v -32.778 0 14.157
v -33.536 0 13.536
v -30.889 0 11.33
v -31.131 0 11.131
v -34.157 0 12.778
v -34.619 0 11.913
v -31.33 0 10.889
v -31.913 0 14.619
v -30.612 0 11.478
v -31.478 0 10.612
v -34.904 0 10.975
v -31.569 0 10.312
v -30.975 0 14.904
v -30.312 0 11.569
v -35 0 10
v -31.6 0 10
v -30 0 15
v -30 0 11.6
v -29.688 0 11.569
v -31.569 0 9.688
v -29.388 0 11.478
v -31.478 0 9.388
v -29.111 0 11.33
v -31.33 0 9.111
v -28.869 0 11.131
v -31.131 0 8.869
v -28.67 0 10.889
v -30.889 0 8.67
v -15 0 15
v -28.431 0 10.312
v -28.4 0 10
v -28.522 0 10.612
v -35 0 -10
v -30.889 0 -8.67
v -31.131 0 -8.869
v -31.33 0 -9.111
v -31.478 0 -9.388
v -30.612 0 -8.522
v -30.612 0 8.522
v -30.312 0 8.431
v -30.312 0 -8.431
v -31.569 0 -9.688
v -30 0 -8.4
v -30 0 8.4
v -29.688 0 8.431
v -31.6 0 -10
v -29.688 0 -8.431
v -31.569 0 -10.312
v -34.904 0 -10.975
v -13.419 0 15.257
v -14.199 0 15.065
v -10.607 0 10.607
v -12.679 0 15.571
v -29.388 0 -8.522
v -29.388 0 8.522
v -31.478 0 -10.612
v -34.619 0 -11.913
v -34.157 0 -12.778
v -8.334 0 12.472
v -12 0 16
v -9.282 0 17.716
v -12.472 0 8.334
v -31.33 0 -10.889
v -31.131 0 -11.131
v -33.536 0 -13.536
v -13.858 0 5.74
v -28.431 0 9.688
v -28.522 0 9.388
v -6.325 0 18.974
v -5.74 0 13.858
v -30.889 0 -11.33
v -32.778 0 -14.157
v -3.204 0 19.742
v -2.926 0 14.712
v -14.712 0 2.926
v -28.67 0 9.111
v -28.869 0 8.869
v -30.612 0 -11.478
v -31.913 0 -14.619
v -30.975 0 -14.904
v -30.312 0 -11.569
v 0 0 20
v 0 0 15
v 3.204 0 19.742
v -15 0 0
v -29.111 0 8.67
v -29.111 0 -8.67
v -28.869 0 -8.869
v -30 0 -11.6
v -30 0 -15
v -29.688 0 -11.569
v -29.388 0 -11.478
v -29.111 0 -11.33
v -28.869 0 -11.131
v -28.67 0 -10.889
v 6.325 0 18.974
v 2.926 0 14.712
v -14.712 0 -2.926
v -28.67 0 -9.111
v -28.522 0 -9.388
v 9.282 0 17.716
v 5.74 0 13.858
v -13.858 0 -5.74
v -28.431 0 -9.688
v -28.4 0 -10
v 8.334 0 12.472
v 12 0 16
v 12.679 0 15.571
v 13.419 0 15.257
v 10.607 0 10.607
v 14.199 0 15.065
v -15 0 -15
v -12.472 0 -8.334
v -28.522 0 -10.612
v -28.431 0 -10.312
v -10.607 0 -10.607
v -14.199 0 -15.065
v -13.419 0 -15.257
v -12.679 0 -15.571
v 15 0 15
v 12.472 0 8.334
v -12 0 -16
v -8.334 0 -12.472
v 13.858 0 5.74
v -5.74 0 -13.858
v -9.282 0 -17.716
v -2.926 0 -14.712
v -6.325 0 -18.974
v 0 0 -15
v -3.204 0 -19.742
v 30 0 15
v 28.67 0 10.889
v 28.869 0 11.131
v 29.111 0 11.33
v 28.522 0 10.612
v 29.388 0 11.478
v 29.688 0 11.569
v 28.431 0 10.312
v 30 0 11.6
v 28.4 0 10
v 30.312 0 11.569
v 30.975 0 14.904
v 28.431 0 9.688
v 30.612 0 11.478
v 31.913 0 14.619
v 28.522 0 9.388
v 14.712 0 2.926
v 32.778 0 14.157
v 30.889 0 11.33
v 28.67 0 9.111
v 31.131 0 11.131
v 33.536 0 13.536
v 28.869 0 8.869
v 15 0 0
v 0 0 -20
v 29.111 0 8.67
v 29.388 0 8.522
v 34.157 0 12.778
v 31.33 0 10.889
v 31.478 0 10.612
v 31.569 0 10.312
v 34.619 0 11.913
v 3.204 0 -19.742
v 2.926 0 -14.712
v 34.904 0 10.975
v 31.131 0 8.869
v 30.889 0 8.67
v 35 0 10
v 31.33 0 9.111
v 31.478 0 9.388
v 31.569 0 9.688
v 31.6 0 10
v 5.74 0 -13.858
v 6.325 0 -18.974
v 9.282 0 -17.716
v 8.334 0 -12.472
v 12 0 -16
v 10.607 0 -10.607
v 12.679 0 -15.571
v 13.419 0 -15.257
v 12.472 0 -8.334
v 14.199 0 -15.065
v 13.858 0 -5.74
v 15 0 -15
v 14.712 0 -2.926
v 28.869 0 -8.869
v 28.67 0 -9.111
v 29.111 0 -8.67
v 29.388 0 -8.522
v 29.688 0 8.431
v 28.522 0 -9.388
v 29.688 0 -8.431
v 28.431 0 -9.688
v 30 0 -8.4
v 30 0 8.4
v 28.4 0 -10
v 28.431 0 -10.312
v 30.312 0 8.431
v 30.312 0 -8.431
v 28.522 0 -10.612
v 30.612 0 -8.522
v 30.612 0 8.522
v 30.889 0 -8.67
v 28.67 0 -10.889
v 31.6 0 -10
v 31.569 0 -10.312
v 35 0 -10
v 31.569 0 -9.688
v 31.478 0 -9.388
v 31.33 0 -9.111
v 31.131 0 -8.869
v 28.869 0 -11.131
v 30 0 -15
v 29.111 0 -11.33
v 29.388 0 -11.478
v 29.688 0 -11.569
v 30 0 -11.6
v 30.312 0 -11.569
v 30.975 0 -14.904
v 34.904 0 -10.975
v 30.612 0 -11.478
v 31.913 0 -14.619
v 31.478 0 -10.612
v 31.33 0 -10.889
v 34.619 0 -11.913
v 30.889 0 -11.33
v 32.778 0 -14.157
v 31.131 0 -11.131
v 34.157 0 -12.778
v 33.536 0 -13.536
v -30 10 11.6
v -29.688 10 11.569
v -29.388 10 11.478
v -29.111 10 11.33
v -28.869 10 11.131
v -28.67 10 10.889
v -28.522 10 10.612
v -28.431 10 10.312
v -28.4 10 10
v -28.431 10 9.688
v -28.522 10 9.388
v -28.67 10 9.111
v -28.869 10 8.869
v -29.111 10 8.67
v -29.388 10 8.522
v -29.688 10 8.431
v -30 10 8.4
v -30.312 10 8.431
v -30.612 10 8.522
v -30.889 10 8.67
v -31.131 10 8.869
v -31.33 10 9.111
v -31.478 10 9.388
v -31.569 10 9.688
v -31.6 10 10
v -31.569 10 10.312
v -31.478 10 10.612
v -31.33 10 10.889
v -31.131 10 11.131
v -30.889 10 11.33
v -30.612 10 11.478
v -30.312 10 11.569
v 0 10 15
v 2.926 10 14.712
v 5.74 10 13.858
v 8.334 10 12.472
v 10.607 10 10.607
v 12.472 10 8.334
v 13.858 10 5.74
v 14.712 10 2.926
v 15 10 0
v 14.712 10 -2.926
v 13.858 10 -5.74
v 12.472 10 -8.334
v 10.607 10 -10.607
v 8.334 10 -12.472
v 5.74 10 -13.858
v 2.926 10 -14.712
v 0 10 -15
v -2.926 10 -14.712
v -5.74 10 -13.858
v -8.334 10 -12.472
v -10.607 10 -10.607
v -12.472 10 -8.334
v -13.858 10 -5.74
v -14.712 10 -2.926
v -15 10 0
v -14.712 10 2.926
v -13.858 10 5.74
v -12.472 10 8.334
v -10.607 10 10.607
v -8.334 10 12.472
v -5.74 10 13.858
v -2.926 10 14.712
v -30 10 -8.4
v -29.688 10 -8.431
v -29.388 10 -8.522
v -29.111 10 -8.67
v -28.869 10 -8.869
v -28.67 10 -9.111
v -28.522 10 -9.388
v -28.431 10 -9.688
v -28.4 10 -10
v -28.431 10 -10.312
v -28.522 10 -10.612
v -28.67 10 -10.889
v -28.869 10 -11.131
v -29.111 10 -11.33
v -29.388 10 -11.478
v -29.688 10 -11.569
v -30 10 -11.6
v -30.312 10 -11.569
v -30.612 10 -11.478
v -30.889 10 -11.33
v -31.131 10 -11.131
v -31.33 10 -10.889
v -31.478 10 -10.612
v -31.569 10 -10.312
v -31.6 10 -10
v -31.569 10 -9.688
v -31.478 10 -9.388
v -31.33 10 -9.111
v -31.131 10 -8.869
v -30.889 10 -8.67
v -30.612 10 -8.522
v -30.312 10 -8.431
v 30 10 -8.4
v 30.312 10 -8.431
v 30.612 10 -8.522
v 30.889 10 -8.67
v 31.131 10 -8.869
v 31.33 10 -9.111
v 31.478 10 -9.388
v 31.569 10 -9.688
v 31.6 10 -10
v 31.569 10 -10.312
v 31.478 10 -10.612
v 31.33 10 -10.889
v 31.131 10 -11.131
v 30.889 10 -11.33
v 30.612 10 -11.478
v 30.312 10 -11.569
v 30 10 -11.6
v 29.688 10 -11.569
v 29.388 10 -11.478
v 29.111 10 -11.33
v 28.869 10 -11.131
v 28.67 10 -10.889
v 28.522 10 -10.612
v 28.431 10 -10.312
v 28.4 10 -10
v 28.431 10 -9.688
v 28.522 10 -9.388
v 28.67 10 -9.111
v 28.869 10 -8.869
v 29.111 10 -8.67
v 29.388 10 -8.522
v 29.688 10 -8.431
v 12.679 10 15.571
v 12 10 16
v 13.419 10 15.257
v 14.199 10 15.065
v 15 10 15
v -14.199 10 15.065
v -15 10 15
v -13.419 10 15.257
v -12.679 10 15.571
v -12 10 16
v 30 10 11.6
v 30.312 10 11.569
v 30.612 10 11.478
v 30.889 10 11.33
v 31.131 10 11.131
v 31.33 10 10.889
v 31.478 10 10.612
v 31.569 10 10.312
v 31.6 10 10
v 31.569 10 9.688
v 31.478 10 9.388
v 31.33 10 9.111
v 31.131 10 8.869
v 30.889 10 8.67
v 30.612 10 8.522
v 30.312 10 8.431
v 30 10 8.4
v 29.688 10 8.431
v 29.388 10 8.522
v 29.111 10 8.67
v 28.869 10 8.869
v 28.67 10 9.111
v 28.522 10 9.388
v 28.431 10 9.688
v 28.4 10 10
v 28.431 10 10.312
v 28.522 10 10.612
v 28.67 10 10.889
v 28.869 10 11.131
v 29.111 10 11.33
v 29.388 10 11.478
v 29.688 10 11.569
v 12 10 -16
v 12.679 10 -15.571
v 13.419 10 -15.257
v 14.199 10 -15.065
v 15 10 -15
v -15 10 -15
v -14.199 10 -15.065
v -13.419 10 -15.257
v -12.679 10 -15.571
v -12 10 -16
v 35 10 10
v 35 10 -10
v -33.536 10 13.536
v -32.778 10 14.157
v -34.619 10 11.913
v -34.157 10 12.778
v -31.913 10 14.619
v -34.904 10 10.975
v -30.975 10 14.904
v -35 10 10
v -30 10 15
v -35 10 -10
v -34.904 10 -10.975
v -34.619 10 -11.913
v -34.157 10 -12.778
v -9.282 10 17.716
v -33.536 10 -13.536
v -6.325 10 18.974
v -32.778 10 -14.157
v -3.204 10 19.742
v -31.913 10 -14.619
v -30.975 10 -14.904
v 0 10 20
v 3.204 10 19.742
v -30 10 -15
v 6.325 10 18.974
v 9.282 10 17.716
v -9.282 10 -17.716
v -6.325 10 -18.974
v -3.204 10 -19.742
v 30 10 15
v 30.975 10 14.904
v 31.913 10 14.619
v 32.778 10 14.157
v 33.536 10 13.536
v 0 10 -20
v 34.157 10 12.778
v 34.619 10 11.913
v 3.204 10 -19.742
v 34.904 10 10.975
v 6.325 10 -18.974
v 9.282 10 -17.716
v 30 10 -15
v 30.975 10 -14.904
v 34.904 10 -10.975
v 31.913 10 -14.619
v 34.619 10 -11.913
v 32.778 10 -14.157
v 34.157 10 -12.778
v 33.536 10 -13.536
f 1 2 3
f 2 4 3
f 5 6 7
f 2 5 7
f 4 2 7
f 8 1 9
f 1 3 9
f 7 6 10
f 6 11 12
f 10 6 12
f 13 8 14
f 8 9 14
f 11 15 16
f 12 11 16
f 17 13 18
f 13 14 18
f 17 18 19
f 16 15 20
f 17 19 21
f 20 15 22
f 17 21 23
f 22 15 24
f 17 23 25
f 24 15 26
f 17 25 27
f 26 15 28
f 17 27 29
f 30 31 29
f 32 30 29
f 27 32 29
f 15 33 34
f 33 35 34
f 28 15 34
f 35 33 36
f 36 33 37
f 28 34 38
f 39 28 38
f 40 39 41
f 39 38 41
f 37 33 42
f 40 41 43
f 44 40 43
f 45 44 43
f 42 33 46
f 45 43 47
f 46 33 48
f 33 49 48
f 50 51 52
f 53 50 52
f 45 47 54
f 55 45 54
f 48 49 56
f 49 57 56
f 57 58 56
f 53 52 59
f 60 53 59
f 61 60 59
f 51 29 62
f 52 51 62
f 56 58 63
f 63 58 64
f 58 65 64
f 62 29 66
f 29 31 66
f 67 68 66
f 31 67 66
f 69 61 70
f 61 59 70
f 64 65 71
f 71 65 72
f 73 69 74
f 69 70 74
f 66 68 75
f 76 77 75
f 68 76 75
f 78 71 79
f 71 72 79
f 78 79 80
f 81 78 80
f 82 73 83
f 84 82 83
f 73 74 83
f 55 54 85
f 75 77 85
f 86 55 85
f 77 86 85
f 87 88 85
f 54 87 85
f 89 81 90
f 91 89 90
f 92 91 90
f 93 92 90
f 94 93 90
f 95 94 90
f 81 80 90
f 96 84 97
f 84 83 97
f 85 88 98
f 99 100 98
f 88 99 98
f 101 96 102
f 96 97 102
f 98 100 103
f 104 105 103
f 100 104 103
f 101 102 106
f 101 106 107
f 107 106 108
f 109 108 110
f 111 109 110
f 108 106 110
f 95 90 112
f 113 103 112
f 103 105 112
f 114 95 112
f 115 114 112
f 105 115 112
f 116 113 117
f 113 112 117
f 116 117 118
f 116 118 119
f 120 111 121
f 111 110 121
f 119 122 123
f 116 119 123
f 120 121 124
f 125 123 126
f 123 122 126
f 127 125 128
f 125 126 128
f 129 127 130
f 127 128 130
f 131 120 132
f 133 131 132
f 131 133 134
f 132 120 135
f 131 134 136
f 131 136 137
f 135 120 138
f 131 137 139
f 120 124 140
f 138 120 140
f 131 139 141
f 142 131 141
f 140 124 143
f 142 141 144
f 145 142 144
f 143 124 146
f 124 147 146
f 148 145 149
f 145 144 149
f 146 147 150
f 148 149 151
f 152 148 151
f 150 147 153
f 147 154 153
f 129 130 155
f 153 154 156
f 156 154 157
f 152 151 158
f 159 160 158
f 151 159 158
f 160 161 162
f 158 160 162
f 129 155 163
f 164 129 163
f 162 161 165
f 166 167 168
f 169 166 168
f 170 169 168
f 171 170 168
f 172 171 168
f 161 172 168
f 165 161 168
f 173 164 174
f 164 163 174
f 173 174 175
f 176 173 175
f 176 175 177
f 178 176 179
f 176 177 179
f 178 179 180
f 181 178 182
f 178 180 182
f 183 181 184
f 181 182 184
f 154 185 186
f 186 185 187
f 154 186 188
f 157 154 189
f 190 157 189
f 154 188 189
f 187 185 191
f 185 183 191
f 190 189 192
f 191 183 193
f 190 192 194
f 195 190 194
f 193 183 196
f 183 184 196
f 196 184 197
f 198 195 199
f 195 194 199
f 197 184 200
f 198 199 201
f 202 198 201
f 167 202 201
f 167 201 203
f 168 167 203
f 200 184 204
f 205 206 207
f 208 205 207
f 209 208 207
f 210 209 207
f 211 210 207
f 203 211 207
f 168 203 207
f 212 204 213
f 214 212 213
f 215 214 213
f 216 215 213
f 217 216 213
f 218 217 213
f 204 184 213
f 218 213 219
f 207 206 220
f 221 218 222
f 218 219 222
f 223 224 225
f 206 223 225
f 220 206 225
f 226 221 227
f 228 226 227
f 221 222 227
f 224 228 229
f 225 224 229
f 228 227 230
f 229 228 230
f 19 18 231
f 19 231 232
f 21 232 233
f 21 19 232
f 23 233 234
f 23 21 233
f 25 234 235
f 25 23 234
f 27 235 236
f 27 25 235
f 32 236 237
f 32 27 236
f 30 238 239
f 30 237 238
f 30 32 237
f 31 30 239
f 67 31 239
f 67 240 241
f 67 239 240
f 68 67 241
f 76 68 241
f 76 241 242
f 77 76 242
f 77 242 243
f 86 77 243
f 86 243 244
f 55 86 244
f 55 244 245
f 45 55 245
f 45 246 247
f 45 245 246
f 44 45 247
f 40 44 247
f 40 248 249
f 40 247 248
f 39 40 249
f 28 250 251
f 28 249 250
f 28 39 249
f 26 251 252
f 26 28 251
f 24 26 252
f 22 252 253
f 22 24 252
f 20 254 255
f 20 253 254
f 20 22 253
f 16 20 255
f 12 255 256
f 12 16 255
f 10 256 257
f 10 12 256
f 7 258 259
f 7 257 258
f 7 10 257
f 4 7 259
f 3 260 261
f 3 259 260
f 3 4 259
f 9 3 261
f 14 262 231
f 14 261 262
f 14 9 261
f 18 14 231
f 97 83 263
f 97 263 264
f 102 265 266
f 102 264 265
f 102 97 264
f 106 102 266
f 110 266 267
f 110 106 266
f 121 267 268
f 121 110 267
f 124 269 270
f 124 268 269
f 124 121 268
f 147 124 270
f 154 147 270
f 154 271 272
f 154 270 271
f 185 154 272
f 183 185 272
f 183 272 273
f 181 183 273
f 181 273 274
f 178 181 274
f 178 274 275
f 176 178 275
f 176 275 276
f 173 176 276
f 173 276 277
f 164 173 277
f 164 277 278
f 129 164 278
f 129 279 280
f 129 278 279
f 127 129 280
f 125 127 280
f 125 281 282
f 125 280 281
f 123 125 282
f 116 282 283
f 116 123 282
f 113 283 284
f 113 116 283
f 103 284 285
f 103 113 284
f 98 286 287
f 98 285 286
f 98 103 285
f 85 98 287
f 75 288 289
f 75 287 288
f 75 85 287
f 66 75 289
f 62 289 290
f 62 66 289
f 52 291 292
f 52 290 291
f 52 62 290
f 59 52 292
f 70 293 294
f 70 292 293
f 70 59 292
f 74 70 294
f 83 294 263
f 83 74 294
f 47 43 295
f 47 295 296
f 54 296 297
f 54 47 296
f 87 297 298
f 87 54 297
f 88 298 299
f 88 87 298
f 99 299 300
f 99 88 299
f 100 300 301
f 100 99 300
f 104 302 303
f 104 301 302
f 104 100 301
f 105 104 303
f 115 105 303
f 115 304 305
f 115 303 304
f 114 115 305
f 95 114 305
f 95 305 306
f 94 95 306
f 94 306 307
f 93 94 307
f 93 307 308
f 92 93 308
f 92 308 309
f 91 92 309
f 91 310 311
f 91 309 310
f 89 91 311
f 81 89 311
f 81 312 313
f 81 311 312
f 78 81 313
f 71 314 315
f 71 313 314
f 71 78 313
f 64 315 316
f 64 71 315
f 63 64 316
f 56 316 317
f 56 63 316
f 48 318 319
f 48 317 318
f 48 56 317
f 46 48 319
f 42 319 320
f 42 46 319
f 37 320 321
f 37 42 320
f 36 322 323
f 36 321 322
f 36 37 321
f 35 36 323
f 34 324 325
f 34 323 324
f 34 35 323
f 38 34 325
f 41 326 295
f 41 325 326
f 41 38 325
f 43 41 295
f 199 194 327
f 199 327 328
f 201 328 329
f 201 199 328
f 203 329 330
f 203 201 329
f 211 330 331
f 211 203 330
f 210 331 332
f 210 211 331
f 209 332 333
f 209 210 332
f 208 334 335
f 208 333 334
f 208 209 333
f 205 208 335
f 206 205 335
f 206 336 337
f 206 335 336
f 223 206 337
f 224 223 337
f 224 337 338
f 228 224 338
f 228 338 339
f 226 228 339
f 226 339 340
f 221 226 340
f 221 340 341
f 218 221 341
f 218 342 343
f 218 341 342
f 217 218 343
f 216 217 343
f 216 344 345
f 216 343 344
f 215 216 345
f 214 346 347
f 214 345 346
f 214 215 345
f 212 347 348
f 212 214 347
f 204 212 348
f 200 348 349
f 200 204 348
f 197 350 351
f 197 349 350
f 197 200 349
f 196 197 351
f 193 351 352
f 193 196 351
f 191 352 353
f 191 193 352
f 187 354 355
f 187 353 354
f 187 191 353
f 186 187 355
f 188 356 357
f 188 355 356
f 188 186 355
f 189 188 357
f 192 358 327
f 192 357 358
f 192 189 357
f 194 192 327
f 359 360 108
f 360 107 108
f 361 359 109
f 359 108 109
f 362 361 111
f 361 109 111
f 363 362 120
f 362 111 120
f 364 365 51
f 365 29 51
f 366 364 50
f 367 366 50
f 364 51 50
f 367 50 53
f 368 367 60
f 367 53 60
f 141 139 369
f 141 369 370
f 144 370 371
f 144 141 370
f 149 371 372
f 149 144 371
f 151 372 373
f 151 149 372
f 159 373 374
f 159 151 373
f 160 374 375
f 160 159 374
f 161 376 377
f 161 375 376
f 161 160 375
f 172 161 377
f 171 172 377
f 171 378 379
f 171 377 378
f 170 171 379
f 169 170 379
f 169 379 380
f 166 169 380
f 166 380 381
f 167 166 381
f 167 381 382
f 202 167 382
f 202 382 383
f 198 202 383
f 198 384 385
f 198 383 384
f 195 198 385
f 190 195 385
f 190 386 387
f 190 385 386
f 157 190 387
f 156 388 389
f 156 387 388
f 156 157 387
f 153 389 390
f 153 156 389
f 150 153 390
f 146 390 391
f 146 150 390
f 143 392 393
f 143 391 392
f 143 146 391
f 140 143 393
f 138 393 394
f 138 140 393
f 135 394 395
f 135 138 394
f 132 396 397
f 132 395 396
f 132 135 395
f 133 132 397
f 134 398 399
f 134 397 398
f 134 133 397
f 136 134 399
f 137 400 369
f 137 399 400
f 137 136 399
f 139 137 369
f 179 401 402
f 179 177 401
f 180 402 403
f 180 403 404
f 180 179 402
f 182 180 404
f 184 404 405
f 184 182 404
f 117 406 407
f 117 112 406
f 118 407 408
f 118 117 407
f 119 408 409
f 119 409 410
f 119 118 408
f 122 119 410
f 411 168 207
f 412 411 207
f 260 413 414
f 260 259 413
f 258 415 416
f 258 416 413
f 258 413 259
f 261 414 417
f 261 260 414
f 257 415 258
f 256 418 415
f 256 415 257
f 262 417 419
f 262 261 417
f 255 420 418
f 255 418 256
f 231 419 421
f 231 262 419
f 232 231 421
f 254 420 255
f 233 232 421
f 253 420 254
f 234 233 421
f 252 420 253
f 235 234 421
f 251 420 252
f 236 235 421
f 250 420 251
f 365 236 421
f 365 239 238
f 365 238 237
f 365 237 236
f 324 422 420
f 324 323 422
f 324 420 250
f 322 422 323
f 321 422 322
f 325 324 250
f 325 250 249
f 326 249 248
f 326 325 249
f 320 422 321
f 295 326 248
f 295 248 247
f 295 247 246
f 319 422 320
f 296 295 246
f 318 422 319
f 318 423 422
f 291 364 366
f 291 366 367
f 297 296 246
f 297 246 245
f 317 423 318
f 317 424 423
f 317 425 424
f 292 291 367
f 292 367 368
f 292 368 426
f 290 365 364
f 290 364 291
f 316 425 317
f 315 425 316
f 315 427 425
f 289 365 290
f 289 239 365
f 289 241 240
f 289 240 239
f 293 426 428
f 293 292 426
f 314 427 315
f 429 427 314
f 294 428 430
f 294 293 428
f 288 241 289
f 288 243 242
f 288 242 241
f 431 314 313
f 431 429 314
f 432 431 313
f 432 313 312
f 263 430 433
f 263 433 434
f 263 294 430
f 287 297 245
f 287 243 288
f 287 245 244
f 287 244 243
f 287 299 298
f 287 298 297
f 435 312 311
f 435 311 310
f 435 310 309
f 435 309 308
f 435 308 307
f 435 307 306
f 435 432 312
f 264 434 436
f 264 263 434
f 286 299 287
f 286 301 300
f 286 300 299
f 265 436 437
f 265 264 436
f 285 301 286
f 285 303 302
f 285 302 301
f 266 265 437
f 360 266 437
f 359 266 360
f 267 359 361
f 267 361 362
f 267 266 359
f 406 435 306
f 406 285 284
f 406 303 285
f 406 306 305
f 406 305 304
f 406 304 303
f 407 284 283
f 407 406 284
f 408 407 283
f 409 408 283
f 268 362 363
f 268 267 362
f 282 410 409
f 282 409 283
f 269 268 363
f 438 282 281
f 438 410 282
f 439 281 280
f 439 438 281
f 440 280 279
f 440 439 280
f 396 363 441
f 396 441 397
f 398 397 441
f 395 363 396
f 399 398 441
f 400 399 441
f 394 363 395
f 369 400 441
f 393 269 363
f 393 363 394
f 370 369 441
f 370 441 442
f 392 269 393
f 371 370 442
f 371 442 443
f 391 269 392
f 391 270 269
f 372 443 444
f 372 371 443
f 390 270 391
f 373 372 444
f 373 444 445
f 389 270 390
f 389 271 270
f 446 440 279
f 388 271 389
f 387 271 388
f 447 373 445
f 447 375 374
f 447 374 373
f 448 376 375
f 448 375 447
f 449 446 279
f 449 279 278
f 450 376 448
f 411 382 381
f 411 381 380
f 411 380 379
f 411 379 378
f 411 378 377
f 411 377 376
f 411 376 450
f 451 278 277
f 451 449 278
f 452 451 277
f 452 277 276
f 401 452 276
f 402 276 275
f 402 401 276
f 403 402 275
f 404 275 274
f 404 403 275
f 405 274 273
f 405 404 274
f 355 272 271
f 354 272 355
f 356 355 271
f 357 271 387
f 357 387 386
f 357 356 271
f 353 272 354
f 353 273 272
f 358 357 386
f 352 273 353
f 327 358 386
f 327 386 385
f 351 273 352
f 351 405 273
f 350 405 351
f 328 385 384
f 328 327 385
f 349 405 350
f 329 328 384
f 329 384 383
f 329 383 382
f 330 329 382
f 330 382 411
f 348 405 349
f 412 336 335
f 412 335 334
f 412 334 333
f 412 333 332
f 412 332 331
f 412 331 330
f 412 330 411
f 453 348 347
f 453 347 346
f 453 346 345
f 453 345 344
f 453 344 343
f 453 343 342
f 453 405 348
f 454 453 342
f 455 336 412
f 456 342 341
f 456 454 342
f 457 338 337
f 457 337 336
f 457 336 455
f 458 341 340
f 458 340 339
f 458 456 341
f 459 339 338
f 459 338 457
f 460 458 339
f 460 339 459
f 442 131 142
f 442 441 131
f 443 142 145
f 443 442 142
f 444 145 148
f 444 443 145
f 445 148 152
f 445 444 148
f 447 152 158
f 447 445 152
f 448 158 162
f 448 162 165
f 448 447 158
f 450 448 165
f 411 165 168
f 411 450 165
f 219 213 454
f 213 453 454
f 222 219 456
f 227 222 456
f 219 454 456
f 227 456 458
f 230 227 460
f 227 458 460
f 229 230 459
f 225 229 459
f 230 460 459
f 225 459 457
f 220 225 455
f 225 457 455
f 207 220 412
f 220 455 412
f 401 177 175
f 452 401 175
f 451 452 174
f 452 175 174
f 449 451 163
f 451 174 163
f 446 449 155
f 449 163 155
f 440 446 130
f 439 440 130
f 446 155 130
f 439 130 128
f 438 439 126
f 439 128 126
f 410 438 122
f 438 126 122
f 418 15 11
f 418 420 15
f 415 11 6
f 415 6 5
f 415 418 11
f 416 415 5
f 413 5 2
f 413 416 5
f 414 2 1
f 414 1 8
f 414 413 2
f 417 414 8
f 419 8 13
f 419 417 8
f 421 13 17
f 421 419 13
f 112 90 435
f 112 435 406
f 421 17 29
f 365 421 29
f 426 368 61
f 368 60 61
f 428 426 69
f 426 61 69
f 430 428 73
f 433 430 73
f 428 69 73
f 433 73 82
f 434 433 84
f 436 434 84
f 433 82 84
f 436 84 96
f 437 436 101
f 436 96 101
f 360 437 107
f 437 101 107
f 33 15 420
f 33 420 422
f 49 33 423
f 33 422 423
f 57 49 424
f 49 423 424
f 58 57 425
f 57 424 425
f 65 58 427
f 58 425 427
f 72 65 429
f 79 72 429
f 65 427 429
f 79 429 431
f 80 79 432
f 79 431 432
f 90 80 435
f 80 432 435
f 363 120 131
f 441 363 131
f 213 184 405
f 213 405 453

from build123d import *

# Parameters (mm, degrees)
SKETCH1_W               = 70
SKETCH1_H               = 30
BOSS_EXTRUDE1_DEPTH     = 10
SKETCH2_R               = 20
BOSS_EXTRUDE2_DEPTH     = 10
CUT_EXTRUDE1_DEPTH      = 42.533119315
CUT_EXTRUDE1_DEPTH_BACK = 42.533119315
SKETCH3_R               = 15
CUT_EXTRUDE2_DEPTH      = 42.533119315
CUT_EXTRUDE2_DEPTH_BACK = 42.533119315
SKETCH4_R               = 1.6
FILLET1_R               = 5


with BuildPart() as part:
    # Sketch1 → Boss-Extrude1 (new body)
    with BuildSketch(Plane(origin=(0, 0, 0), x_dir=(1, 0, 0), z_dir=(0, 1, 0))):
        Rectangle(SKETCH1_W, SKETCH1_H)
    extrude(amount=BOSS_EXTRUDE1_DEPTH)

    # Sketch2 → Boss-Extrude2 (add)
    with BuildSketch(Plane(origin=(0, 0, 0), x_dir=(1, 0, 0), z_dir=(0, 1, 0))):
        Circle(SKETCH2_R)
    extrude(amount=BOSS_EXTRUDE2_DEPTH)

    # Sketch3 → Cut-Extrude1 (cut, two sides: drawn at the far end of the back side and taken through both)
    with BuildSketch(Plane(origin=(0, 10, 0), x_dir=(1, 0, 0), z_dir=(0, 1, 0)).offset(-CUT_EXTRUDE1_DEPTH_BACK)):
        with Locations(Location((0, 0, 0), (0, 0, 270))):
            Circle(SKETCH3_R)
    extrude(amount=CUT_EXTRUDE1_DEPTH + CUT_EXTRUDE1_DEPTH_BACK, mode=Mode.SUBTRACT)

    # Sketch4 → Cut-Extrude2 (cut, two sides: drawn at the far end of the back side and taken through both)
    with BuildSketch(Plane(origin=(0, 10, 0), x_dir=(1, 0, 0), z_dir=(0, 1, 0)).offset(-CUT_EXTRUDE2_DEPTH_BACK)):
        with Locations(Location((-30, 10, 0), (0, 0, 270))):
            Circle(SKETCH4_R)
        with Locations(Location((30, -10, 0), (0, 0, 270))):
            Circle(SKETCH4_R)
        with Locations(Location((30, 10, 0), (0, 0, 270))):
            Circle(SKETCH4_R)
        with Locations(Location((-30, -10, 0), (0, 0, 270))):
            Circle(SKETCH4_R)
    extrude(amount=CUT_EXTRUDE2_DEPTH + CUT_EXTRUDE2_DEPTH_BACK, mode=Mode.SUBTRACT)

    # Fillet1
    fillet1_edges = [part.edges().sort_by_distance(p)[0] for p in [
        (-13.228756555, 5, -15),
        (13.228756555, 5, -15),
        (13.228756555, 5, 15),
        (-13.228756555, 5, 15),
        (35, 5, 15),
        (-35, 5, 15),
        (-35, 5, -15),
        (35, 5, -15),
    ]]
    fillet(fillet1_edges, radius=FILLET1_R)


solid = part.part
